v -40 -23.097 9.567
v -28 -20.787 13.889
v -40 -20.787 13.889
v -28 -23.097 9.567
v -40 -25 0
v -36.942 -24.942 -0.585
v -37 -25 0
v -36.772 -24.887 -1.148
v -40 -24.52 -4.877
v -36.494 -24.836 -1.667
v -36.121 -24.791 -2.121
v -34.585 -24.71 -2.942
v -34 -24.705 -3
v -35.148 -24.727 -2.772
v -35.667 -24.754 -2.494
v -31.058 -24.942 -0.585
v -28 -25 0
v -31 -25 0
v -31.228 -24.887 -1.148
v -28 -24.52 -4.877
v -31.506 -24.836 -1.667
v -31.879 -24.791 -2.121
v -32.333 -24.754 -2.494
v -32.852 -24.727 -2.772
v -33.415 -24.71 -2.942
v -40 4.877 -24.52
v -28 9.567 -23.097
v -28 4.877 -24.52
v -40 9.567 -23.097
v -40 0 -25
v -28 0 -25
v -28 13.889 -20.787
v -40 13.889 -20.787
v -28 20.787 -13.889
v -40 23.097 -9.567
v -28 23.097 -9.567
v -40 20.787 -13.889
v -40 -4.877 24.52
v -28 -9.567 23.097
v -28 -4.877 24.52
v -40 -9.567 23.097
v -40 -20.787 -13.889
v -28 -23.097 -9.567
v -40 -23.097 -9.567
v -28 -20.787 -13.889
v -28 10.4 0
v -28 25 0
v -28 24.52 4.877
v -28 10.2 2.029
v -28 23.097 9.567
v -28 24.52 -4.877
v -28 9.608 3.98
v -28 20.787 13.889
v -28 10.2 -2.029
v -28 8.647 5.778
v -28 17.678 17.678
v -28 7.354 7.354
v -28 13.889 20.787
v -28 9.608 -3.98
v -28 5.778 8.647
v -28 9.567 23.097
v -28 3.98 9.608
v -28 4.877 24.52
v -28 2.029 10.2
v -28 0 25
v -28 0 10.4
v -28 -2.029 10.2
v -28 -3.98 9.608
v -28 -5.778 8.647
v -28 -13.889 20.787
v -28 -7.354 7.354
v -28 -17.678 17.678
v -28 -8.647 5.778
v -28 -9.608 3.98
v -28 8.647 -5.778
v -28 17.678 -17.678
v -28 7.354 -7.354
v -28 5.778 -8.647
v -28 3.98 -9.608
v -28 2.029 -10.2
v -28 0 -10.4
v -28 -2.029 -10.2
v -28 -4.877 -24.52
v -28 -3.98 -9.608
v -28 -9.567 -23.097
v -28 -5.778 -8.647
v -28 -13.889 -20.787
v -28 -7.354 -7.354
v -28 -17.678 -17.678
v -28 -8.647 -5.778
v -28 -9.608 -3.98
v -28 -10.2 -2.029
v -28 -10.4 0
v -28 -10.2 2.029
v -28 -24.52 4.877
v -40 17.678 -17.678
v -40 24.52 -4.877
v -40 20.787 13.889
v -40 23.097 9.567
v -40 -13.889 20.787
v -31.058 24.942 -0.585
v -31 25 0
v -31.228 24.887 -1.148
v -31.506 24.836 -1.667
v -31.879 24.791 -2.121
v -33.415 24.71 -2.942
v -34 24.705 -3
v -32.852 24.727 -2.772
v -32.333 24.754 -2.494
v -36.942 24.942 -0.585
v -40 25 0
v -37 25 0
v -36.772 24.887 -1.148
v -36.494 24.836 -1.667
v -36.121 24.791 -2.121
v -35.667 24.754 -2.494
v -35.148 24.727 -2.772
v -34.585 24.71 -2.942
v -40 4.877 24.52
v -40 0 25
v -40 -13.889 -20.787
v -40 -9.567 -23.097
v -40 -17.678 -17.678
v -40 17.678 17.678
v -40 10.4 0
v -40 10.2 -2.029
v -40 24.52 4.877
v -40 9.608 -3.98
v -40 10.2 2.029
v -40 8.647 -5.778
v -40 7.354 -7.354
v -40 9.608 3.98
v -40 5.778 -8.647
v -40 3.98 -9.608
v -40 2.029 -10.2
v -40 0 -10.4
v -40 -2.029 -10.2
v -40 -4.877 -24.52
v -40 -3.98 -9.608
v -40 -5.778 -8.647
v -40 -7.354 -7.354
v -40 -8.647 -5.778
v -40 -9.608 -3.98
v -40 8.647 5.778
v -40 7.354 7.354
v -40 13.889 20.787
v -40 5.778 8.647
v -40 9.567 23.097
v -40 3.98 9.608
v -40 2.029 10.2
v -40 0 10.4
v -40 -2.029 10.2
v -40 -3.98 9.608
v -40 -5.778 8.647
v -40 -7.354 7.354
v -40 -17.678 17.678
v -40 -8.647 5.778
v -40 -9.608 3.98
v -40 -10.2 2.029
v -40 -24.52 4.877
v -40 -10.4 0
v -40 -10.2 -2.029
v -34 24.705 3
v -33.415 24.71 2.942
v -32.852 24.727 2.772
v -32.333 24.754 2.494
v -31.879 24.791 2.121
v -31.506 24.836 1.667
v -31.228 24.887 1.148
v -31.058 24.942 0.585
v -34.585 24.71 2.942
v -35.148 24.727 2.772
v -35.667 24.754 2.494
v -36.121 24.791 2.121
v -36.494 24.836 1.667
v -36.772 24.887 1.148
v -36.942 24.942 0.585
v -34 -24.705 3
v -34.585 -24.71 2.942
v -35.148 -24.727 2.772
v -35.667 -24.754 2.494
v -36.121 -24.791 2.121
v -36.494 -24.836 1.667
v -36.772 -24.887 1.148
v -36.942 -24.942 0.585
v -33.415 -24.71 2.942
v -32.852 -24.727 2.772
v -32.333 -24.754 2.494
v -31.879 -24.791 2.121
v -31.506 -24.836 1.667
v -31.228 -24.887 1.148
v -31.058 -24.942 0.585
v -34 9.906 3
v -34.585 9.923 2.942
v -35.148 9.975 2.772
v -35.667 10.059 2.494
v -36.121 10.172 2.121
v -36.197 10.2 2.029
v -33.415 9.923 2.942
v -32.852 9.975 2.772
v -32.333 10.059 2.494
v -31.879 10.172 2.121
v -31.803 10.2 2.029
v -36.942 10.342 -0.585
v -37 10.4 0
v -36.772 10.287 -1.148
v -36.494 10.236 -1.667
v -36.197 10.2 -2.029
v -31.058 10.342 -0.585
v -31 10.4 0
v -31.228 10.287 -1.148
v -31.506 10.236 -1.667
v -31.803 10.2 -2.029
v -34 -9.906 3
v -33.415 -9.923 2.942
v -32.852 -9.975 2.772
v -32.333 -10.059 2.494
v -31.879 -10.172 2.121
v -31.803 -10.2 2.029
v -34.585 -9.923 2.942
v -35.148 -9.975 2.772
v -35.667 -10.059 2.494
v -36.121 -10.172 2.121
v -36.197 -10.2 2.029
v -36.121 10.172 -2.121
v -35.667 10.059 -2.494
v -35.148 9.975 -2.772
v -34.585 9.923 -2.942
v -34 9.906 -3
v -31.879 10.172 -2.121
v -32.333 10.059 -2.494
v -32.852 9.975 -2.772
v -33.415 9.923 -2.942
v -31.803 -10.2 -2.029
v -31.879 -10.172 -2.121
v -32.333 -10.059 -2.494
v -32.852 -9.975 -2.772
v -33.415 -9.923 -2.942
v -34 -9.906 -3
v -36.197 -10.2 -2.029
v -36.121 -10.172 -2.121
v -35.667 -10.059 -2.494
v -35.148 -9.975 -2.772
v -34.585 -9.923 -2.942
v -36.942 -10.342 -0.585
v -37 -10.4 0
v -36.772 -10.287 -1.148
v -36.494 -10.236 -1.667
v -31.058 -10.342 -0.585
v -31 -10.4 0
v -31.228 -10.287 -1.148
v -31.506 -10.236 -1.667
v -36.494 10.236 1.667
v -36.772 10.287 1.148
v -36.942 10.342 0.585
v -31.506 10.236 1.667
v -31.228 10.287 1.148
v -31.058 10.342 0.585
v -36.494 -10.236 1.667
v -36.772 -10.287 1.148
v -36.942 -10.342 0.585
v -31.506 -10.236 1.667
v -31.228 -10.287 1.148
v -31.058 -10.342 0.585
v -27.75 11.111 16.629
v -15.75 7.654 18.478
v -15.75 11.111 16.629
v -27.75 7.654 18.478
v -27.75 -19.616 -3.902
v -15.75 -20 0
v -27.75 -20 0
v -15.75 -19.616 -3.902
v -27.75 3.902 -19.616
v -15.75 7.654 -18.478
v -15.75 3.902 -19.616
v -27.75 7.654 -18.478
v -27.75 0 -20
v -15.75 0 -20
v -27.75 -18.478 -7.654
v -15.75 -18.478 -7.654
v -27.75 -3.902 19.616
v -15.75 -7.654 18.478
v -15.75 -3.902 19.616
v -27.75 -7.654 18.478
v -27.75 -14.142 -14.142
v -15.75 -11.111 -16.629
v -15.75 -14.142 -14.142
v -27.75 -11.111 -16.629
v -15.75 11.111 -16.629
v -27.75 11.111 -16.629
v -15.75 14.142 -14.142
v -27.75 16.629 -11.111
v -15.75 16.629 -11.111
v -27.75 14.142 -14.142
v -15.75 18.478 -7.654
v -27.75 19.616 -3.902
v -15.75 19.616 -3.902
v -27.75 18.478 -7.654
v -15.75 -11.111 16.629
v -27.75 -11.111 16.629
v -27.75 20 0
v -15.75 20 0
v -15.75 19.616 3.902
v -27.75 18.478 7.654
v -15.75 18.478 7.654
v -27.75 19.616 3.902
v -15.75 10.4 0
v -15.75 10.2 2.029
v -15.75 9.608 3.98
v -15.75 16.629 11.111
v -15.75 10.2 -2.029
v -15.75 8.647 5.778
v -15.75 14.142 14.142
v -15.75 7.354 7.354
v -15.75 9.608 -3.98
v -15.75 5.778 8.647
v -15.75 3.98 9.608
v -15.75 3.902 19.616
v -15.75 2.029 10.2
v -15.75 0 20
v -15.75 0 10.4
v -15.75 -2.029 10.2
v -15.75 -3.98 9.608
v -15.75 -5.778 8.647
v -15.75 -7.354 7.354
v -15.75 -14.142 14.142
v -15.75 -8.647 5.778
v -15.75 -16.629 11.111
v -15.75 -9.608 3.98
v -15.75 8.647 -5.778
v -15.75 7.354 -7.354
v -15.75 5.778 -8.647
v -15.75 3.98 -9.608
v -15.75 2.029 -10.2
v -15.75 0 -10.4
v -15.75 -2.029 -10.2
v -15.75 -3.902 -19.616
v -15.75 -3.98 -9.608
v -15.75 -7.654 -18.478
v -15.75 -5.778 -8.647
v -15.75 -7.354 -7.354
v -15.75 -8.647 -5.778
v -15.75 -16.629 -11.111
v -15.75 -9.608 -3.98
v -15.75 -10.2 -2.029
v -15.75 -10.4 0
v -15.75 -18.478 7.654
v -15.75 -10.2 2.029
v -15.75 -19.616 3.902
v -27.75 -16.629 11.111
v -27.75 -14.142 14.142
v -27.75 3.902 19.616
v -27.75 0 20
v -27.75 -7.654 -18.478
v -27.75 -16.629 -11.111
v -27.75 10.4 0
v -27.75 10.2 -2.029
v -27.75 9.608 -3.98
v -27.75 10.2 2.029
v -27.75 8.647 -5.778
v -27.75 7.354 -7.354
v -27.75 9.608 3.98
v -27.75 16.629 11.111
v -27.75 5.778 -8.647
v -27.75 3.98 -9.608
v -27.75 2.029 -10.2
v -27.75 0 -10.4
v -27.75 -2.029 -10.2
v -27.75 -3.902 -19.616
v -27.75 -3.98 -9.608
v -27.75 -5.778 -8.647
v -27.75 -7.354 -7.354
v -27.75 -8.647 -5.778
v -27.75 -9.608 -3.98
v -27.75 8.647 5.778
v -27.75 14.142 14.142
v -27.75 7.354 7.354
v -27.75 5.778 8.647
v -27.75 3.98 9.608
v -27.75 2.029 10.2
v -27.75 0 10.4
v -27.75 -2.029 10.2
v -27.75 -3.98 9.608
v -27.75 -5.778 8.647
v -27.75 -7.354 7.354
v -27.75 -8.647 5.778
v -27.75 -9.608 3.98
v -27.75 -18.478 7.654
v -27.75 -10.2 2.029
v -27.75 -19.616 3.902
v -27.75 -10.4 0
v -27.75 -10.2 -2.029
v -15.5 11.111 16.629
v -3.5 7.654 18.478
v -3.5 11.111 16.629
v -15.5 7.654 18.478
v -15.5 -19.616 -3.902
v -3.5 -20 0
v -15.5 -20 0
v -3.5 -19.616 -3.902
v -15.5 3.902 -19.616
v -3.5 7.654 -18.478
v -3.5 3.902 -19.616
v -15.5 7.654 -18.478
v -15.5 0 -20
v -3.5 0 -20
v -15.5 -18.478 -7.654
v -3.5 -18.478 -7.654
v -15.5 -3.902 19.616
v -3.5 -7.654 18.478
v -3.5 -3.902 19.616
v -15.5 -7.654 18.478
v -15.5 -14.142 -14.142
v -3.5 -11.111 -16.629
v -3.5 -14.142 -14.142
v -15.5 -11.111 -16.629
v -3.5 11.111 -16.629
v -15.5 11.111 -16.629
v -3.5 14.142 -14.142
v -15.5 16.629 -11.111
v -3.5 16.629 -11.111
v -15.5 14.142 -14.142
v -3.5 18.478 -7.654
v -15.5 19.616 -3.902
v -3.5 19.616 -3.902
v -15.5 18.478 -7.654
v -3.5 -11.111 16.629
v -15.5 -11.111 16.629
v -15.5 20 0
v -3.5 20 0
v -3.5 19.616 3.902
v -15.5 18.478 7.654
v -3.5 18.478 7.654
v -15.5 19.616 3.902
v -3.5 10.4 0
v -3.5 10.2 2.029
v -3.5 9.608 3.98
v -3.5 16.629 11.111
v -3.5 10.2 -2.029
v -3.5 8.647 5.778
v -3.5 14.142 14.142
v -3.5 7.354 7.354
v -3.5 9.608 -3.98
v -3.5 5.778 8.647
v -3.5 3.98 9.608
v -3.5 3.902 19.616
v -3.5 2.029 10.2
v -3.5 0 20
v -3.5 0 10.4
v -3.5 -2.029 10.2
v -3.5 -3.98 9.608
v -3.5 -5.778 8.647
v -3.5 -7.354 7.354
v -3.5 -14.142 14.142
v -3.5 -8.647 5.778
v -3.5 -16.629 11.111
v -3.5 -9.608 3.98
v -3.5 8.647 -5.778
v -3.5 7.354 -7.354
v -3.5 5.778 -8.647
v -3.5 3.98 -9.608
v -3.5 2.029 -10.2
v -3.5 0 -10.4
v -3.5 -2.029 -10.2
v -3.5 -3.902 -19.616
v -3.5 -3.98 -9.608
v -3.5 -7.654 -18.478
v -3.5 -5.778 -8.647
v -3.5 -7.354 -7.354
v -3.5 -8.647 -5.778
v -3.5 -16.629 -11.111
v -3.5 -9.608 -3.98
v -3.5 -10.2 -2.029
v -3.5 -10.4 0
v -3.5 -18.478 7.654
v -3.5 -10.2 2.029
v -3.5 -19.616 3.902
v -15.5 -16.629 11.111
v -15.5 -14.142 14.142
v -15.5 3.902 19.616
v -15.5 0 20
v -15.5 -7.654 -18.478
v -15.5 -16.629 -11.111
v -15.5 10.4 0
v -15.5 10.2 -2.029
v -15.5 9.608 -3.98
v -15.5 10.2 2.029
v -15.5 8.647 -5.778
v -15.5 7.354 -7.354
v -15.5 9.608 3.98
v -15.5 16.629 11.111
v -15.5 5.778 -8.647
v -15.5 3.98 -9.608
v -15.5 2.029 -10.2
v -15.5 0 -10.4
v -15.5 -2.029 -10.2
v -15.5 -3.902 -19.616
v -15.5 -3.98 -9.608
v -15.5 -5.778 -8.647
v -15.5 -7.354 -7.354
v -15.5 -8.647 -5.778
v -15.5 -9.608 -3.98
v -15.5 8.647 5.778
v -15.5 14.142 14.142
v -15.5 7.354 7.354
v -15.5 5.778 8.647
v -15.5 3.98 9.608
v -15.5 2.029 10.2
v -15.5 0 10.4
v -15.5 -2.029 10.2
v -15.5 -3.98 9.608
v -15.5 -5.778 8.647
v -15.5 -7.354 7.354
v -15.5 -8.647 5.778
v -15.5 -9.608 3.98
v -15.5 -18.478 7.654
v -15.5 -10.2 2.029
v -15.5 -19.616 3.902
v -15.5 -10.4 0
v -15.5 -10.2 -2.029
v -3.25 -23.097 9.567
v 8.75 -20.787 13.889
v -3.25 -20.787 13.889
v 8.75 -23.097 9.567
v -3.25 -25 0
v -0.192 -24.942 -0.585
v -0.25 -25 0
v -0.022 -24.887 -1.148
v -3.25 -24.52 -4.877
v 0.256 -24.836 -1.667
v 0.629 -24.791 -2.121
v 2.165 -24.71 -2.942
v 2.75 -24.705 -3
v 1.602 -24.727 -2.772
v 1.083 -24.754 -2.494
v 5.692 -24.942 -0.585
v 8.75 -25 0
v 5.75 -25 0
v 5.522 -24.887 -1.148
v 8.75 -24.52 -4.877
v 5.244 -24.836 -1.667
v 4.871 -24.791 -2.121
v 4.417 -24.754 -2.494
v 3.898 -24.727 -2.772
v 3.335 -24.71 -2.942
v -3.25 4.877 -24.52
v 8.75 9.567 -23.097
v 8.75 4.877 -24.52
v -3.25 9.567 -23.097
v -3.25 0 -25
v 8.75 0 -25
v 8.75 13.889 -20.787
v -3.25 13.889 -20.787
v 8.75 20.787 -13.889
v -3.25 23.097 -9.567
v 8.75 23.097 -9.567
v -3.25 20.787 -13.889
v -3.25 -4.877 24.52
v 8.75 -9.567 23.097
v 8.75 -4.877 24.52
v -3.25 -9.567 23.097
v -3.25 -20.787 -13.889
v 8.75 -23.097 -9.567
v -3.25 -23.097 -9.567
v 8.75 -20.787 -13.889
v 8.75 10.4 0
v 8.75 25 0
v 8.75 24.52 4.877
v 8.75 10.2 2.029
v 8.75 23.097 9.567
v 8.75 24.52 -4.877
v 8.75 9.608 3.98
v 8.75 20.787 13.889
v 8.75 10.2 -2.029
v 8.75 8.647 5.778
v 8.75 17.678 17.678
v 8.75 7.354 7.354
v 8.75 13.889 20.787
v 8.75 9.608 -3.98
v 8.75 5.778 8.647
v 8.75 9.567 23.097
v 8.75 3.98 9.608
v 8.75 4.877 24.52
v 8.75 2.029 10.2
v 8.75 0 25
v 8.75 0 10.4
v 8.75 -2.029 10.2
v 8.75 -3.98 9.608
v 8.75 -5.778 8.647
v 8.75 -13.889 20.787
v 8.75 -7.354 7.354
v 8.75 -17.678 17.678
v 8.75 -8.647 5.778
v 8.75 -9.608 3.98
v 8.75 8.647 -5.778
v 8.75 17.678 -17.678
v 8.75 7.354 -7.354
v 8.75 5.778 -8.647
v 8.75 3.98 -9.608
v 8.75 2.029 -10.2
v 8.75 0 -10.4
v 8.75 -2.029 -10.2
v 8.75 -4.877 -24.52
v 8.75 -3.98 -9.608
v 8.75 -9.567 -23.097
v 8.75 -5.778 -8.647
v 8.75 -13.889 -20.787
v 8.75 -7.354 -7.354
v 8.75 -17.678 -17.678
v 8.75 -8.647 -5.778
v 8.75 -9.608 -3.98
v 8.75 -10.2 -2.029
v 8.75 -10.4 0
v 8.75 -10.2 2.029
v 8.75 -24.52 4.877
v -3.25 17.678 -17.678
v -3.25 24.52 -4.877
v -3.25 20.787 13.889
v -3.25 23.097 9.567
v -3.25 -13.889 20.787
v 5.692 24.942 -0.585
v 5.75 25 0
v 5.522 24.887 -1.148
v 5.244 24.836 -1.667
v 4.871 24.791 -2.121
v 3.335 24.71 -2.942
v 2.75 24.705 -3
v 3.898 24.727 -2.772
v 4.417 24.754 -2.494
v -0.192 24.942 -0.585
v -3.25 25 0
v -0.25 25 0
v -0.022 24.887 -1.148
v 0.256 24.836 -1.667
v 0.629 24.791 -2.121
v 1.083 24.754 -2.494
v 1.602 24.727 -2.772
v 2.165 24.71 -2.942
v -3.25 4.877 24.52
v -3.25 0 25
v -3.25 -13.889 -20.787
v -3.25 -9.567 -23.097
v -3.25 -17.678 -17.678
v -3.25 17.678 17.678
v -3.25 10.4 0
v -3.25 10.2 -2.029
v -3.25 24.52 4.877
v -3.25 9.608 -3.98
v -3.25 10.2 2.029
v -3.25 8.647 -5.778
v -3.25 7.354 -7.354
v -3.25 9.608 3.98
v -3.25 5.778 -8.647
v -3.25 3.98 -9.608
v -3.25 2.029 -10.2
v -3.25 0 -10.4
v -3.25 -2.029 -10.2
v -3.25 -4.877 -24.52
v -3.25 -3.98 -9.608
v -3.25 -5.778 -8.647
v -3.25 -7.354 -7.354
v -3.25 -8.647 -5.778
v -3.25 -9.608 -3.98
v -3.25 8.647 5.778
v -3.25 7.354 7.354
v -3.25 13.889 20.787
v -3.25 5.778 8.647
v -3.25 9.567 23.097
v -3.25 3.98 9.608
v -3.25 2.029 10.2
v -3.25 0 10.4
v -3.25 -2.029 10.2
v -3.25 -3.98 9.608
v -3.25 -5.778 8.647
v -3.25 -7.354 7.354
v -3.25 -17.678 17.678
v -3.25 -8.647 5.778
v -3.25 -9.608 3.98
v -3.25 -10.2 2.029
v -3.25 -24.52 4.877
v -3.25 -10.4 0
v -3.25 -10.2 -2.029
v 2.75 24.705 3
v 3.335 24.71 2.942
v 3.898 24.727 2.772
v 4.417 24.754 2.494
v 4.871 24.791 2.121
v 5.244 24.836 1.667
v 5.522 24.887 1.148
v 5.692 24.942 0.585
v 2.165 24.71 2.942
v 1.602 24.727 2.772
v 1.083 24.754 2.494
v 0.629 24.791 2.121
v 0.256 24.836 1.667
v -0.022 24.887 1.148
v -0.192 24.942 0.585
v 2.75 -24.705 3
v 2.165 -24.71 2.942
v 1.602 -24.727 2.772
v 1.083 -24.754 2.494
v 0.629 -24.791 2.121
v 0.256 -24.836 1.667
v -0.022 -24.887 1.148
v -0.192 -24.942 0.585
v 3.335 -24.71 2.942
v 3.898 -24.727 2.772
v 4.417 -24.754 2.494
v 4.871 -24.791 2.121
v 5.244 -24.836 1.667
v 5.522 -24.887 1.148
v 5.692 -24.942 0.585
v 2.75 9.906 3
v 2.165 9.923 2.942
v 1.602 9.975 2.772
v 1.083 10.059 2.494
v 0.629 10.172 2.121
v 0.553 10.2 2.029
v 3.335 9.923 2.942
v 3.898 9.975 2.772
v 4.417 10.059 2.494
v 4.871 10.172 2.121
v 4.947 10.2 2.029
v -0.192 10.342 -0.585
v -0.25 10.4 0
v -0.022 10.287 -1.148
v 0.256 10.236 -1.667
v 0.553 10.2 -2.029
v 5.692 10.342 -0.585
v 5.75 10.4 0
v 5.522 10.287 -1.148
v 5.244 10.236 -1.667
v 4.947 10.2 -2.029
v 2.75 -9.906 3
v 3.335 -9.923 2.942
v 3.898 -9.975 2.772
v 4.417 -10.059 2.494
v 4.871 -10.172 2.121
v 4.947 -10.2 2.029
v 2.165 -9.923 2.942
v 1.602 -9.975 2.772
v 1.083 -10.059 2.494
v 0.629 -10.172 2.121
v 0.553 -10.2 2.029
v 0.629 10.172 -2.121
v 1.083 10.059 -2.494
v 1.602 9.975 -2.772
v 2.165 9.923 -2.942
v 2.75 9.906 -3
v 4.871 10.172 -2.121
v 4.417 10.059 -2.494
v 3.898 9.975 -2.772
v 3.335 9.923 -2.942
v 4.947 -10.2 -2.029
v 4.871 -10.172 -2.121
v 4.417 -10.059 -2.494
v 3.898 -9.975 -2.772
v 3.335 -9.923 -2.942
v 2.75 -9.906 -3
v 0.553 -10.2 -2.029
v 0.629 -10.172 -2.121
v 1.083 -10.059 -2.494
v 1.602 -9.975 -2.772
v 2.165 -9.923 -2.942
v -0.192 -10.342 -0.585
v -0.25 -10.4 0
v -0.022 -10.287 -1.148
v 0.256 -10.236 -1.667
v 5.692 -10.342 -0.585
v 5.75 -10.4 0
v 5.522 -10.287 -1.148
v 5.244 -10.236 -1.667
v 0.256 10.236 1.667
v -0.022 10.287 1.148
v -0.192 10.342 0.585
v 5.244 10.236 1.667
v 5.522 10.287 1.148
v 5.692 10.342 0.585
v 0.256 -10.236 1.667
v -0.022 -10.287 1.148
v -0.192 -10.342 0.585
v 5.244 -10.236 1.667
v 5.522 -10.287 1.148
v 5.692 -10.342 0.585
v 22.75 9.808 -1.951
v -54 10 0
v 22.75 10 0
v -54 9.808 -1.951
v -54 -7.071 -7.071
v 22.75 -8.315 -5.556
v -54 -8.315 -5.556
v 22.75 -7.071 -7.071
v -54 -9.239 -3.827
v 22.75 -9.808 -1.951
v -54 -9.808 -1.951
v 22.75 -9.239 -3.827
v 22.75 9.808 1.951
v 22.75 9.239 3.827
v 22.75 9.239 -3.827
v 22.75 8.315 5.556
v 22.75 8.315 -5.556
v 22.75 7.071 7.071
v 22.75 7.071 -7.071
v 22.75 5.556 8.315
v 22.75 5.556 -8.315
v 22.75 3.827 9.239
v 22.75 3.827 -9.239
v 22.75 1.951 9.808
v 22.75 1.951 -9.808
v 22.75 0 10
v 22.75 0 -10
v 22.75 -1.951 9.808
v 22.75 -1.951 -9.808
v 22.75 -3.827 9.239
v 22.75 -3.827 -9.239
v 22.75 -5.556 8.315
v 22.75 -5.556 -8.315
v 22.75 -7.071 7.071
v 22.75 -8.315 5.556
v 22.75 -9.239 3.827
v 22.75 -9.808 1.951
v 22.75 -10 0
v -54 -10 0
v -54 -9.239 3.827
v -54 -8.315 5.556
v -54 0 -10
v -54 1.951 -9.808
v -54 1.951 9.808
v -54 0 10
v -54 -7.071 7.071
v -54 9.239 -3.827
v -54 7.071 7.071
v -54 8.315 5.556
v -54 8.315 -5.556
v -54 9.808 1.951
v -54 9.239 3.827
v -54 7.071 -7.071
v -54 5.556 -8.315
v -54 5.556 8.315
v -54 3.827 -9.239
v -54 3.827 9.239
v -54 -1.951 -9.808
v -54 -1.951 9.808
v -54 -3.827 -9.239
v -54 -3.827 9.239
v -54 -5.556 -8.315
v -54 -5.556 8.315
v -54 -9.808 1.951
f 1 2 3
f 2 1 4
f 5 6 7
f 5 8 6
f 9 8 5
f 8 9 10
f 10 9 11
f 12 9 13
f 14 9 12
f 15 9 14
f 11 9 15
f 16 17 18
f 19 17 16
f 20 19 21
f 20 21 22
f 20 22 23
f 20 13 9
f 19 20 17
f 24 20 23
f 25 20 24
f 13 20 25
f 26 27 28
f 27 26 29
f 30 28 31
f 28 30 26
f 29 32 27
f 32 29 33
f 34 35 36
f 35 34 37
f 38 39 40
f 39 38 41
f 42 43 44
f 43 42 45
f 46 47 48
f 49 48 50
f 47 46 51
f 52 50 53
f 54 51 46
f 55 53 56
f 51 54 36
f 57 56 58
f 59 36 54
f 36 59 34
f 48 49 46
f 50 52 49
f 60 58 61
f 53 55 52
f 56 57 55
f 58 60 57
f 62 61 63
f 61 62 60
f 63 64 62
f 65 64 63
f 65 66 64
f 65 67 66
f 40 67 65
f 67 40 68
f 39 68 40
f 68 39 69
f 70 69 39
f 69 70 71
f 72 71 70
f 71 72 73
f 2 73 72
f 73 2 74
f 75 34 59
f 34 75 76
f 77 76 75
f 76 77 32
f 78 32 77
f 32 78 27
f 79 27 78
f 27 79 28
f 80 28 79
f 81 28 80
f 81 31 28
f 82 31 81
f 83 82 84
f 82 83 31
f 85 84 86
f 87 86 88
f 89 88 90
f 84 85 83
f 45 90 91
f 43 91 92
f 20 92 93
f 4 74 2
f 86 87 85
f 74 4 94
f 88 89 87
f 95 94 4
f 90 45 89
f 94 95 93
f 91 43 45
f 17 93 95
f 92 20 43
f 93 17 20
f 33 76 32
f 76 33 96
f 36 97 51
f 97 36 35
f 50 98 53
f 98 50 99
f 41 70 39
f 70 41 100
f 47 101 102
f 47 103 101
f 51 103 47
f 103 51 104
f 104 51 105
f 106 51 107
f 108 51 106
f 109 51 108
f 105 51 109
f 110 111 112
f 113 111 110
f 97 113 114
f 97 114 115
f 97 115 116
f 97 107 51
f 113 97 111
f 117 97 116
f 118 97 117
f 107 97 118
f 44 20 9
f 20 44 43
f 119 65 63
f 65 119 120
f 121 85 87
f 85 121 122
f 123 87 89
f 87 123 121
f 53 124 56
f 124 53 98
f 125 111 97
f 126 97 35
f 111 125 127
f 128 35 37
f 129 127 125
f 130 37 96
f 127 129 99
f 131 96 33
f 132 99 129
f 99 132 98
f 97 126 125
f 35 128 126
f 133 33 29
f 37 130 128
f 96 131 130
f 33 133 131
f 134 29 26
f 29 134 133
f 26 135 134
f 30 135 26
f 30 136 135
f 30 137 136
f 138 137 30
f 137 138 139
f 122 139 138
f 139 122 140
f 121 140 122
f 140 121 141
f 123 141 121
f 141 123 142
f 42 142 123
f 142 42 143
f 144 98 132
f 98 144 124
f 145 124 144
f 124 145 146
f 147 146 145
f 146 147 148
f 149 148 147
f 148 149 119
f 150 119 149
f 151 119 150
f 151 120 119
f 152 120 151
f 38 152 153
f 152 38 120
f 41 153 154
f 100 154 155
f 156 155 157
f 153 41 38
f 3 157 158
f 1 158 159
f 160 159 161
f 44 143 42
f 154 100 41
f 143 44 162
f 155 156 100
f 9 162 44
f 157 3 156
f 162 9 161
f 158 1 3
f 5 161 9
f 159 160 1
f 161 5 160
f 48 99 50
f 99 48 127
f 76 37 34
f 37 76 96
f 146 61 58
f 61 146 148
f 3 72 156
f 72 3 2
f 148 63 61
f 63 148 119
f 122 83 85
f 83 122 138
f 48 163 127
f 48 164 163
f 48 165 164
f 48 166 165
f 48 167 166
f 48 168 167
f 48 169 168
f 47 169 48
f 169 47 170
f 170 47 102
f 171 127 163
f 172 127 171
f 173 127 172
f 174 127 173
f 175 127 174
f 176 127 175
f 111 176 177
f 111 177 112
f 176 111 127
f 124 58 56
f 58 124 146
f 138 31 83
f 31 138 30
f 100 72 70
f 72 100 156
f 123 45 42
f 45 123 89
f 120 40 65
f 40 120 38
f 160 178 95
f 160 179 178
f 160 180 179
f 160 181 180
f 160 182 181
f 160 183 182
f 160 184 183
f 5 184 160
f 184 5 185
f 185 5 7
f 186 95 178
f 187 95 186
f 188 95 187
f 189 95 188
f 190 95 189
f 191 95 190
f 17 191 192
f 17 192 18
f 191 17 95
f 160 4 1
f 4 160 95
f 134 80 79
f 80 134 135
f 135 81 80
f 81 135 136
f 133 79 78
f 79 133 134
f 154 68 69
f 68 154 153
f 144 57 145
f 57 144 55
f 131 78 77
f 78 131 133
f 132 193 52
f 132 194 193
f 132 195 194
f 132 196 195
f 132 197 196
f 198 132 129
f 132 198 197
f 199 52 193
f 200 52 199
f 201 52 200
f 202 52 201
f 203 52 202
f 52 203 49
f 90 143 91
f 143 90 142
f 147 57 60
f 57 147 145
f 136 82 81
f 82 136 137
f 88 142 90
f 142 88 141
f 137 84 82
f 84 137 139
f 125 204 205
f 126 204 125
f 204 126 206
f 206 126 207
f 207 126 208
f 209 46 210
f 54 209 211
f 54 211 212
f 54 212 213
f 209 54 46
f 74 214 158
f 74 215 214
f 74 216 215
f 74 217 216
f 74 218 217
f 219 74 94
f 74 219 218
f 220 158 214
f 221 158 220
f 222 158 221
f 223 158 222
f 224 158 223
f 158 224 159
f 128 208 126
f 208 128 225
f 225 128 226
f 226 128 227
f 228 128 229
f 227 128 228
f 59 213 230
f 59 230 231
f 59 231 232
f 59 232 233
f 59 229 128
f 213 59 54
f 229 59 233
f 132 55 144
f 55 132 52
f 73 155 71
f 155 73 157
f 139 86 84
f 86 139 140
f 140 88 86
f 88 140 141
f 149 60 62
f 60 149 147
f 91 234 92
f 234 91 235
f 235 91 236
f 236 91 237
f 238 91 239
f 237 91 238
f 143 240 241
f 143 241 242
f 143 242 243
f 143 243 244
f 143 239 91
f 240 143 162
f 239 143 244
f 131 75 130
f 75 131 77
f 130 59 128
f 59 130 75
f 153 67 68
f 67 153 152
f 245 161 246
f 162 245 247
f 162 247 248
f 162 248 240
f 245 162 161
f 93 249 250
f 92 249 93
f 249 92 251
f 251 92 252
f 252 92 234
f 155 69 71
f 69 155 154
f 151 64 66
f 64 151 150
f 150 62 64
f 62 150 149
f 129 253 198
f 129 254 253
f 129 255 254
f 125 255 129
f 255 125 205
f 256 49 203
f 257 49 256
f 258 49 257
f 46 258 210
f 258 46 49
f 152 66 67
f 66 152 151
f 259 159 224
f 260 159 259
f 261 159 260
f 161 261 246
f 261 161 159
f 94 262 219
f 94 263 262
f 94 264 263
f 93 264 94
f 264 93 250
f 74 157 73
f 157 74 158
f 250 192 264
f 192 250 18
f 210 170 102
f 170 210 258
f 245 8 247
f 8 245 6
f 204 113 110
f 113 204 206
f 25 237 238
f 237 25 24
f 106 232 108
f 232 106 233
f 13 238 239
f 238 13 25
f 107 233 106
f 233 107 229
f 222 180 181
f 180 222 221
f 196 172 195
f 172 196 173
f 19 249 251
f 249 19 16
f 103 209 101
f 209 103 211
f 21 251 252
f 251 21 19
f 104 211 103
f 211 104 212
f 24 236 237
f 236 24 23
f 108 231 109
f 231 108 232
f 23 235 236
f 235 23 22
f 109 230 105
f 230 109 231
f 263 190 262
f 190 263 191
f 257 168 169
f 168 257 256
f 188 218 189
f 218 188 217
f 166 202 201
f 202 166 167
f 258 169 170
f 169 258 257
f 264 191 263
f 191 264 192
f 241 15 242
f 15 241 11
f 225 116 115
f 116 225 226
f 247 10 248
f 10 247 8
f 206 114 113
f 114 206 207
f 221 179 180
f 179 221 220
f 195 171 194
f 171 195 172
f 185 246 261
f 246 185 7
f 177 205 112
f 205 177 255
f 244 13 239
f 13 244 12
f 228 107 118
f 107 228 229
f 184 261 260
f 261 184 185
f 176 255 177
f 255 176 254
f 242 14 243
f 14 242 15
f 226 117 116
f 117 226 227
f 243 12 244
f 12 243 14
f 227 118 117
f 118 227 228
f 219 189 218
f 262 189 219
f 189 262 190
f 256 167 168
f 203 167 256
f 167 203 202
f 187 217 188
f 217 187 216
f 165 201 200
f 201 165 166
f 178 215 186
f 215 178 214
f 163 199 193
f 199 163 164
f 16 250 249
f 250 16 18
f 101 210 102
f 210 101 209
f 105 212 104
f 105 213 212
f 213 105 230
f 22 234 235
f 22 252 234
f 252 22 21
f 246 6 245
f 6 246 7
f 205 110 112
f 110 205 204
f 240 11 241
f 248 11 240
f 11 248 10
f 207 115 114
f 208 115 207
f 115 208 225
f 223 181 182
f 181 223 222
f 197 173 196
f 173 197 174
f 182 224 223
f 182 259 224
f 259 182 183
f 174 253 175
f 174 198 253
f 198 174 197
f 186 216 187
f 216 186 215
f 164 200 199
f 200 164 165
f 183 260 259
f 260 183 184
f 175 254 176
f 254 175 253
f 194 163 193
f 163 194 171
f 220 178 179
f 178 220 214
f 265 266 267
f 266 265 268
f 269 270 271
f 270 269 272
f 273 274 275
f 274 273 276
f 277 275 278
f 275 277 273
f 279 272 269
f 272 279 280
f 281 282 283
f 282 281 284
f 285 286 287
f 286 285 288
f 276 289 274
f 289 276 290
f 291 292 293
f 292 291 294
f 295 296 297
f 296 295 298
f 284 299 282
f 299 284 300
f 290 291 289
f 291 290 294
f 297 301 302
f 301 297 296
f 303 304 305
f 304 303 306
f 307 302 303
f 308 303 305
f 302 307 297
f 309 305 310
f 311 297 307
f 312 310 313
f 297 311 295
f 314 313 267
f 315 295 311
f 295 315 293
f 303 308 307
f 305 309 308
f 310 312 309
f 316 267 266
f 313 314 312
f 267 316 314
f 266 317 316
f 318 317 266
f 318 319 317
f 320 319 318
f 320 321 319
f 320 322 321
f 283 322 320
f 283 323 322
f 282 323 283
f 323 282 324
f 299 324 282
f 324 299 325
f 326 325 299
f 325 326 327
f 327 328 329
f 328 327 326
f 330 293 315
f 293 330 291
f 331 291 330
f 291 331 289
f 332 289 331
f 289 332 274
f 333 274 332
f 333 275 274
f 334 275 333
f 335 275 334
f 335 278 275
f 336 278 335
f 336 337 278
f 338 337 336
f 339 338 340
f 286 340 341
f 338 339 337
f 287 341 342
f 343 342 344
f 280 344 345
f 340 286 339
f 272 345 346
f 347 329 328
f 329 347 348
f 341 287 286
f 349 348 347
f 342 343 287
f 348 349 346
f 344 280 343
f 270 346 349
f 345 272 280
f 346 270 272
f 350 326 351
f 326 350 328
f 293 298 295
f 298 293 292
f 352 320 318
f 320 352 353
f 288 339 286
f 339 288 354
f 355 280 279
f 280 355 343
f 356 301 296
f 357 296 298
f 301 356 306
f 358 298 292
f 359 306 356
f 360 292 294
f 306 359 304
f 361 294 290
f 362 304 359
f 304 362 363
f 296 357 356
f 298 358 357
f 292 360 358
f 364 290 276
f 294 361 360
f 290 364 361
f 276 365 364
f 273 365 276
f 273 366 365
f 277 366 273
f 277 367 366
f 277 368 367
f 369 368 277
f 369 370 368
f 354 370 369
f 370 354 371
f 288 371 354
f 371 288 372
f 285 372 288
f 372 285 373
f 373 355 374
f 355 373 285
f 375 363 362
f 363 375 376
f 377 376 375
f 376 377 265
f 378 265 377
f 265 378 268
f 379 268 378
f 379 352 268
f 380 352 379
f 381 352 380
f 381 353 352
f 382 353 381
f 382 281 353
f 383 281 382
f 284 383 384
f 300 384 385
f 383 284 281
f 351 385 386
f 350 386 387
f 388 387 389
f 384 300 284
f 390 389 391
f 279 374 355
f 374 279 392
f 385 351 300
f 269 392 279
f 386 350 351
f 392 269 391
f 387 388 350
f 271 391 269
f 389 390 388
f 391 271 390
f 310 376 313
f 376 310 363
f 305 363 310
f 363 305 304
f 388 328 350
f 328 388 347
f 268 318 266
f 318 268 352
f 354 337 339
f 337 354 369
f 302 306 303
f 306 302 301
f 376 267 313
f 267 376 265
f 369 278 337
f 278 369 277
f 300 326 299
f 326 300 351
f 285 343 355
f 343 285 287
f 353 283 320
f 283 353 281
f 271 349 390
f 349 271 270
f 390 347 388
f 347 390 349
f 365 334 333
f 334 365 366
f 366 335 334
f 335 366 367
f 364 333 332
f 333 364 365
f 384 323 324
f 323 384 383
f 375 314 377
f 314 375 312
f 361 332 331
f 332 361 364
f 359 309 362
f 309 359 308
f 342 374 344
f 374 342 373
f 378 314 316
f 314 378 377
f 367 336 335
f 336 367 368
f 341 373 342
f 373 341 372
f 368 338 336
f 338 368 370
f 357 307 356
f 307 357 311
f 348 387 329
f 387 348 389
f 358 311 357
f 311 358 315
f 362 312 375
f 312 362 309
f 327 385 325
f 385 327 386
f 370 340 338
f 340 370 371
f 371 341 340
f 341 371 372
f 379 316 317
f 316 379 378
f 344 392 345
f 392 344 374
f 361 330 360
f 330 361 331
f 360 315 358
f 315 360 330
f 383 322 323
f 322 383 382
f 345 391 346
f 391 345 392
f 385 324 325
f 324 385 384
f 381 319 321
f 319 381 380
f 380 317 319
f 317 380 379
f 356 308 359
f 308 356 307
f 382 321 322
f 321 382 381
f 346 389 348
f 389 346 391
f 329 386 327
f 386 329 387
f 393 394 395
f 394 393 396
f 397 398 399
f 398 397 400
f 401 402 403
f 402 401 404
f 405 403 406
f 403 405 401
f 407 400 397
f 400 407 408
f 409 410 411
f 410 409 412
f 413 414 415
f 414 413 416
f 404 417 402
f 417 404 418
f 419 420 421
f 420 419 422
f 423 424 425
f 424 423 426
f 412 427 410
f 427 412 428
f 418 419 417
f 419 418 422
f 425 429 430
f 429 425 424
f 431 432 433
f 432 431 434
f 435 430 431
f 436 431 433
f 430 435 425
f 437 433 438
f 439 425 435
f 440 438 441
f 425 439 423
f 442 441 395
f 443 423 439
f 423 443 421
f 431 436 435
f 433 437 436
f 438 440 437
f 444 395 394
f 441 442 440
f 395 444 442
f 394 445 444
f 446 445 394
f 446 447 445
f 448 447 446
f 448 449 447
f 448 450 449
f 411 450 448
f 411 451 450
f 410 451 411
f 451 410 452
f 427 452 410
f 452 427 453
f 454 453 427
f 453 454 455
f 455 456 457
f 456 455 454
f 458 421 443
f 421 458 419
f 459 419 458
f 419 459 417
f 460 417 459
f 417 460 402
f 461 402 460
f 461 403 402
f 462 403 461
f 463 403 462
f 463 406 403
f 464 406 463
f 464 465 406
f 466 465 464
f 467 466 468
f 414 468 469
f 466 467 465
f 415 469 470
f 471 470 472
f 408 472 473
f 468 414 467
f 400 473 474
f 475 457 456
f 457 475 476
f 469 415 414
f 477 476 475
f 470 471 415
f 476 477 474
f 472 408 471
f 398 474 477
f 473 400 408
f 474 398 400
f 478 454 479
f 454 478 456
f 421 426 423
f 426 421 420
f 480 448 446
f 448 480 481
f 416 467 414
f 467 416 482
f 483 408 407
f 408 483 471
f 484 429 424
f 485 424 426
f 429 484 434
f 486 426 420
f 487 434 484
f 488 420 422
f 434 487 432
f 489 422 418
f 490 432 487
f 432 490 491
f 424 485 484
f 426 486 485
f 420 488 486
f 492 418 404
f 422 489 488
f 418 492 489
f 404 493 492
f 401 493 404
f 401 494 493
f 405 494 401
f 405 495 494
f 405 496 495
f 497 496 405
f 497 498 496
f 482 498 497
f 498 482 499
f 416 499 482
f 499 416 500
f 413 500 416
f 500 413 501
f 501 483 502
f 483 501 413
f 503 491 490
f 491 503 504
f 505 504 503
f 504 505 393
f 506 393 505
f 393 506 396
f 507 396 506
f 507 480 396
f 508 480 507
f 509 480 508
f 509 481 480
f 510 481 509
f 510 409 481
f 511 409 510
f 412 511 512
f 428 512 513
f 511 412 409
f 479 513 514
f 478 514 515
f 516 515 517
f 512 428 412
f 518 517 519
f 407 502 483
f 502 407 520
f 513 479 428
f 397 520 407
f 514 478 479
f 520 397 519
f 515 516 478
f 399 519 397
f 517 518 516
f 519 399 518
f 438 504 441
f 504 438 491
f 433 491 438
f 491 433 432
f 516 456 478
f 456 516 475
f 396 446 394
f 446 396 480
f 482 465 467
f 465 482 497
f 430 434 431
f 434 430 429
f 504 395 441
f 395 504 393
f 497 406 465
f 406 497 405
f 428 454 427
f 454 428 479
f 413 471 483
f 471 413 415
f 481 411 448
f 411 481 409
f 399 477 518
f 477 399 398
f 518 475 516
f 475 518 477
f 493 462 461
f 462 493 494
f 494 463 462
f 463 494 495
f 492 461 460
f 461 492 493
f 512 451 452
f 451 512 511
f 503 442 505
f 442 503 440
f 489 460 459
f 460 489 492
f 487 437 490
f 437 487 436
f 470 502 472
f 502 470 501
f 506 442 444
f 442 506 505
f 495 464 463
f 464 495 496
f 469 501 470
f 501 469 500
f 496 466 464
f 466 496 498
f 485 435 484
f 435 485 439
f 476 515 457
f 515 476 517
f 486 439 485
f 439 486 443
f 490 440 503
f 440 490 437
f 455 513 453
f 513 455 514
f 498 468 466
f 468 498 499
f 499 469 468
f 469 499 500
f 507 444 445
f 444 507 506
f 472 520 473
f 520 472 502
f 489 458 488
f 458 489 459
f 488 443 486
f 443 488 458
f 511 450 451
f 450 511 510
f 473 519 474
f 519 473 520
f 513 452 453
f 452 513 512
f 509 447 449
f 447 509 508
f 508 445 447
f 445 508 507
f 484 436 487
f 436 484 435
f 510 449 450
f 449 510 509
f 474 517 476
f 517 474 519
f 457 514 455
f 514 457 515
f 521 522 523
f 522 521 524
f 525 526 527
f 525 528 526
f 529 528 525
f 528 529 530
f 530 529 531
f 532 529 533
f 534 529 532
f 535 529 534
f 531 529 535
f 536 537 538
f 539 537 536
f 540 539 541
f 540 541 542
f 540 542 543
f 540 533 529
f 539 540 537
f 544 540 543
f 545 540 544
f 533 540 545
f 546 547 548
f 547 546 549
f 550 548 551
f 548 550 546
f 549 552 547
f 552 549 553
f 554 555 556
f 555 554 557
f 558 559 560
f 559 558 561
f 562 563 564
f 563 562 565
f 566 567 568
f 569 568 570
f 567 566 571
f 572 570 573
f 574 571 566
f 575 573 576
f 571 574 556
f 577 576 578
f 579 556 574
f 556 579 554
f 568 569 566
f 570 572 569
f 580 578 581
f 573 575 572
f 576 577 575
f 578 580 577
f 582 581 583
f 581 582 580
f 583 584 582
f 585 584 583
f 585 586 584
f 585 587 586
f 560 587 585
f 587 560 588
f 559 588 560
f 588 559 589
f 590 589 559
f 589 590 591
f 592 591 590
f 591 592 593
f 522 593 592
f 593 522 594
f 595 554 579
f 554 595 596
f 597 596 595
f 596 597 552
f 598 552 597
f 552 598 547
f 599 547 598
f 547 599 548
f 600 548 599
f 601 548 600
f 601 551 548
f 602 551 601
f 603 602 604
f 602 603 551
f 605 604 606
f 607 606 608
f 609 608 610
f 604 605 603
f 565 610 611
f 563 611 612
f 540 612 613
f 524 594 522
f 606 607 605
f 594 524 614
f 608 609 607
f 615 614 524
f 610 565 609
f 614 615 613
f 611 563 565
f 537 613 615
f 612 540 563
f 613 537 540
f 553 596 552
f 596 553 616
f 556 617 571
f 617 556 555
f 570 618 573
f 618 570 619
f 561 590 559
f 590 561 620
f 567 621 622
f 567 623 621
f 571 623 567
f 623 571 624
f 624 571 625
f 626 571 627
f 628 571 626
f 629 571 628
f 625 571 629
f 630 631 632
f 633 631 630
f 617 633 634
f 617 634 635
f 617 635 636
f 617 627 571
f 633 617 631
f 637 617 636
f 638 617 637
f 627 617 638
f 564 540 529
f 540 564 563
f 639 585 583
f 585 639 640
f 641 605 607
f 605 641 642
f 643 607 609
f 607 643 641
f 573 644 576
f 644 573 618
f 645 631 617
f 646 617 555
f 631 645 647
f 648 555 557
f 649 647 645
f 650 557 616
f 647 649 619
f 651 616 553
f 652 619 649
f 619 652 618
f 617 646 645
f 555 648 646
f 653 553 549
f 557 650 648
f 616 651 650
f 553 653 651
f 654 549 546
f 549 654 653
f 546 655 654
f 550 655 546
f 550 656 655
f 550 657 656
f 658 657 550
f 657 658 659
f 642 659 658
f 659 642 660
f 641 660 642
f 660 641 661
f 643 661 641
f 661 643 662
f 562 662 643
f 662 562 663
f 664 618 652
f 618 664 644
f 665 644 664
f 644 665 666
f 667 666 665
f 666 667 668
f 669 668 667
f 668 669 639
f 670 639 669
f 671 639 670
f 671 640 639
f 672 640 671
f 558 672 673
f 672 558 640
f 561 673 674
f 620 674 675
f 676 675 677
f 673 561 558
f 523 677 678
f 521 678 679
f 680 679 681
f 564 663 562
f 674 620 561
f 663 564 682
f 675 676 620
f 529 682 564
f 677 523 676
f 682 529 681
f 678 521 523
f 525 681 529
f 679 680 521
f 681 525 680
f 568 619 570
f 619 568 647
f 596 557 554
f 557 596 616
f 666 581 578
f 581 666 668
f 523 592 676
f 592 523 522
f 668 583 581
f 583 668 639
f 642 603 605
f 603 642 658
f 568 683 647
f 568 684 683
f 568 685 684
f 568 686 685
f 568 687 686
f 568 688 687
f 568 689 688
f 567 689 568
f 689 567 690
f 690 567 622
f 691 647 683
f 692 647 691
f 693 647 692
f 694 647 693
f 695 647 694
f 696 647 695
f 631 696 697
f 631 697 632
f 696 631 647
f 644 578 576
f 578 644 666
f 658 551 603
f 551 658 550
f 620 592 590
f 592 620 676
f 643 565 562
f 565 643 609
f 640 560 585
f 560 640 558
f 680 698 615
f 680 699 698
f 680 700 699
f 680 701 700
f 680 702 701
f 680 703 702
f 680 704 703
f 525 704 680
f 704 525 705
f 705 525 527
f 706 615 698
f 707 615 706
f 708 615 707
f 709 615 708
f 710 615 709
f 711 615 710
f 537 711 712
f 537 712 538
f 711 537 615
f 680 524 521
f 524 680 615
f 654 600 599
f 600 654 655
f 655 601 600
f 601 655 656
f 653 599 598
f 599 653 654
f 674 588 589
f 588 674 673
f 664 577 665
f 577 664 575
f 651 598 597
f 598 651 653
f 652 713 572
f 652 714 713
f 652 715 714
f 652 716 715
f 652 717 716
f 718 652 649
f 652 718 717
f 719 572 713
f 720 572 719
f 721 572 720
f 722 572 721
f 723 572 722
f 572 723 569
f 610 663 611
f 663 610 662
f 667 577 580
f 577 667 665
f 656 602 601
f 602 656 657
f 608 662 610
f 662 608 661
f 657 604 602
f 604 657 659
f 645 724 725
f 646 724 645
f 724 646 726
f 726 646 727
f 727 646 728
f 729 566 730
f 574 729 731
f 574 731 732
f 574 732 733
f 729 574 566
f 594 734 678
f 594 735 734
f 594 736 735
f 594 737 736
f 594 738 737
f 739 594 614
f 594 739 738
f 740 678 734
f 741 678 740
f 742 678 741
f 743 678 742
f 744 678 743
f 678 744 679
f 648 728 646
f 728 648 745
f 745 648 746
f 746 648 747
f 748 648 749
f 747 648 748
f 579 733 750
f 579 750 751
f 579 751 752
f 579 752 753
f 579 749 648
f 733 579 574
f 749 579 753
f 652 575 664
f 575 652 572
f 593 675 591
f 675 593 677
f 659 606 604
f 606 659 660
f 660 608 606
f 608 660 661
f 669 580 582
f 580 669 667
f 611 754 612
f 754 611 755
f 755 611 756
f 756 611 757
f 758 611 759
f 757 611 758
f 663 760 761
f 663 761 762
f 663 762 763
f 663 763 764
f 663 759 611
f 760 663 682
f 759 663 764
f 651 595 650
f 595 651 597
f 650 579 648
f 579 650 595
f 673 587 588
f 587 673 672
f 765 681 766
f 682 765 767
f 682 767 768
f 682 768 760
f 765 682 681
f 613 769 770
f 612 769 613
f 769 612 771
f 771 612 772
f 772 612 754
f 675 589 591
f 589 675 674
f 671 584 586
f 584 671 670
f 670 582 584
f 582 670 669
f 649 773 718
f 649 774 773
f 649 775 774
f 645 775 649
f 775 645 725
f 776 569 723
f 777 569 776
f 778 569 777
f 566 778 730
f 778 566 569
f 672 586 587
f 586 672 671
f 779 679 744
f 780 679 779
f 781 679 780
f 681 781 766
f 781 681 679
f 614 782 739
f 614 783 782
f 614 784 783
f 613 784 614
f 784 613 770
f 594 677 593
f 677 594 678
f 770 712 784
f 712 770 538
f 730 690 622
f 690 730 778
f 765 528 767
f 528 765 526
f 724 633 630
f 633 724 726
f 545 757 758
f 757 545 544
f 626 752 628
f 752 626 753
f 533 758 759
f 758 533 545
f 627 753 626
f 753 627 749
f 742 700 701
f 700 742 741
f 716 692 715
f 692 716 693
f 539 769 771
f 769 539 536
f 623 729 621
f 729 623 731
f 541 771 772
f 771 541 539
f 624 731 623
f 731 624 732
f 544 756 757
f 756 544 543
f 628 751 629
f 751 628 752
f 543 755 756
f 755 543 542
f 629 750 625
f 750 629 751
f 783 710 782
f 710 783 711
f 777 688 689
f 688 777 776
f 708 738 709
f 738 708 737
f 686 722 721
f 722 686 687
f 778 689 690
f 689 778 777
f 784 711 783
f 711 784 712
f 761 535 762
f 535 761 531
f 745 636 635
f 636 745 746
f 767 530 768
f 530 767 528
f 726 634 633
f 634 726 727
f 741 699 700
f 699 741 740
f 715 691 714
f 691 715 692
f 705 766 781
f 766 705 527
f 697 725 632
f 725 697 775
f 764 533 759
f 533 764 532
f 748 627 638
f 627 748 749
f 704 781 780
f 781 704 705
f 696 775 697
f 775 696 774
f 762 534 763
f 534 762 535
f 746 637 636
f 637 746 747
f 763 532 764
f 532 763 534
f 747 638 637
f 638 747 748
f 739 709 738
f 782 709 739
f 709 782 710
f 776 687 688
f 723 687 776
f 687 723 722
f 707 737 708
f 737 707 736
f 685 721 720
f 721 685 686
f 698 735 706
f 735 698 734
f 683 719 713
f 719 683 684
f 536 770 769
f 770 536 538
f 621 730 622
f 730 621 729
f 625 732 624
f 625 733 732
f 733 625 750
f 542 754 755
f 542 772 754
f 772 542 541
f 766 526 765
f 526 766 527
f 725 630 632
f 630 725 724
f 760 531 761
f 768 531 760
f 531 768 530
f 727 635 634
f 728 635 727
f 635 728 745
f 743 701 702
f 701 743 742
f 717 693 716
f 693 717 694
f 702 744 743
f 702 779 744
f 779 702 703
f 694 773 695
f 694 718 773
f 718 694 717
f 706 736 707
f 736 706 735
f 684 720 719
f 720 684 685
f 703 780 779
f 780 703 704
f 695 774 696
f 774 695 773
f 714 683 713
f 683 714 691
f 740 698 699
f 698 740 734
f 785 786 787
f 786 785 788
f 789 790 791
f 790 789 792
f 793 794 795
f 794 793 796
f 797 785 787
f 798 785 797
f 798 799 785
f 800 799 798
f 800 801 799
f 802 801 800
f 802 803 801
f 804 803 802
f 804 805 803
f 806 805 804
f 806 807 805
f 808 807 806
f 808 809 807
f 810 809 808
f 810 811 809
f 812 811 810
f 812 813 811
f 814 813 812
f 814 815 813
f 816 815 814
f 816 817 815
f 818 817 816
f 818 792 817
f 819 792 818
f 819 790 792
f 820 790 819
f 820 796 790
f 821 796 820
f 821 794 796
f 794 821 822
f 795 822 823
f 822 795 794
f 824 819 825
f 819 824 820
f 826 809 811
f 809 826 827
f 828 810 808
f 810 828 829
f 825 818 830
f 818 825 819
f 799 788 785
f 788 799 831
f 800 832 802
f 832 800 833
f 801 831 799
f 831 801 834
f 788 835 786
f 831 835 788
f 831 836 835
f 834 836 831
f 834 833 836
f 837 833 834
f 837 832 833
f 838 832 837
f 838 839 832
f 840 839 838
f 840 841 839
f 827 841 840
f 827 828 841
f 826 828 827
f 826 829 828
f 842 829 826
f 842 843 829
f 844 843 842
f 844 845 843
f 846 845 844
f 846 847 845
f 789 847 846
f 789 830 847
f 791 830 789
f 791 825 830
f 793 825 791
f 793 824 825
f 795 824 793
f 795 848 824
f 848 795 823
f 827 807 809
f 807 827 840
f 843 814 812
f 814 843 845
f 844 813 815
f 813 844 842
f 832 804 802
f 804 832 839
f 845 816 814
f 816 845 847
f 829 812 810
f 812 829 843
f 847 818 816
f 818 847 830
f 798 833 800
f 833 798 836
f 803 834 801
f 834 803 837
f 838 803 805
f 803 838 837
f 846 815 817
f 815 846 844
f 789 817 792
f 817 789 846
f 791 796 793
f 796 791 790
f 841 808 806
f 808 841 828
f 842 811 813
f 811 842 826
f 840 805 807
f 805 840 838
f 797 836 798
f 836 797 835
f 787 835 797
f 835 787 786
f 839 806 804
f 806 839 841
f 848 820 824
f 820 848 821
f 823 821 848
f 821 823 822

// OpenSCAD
$fn = 32;

// ------------------------------------------------------------------------
// Shaft with rings and collars: d20 shaft, 4 rings
// Every part is its own module, assembly() places them once.
// ------------------------------------------------------------------------

// --- part 1 ---
module shaft() {
  translate([0, 0, -38.375]) cylinder(h = 76.75, d = 20);
}

// --- part 2 ---
module collar_a() {
  difference() {
    cylinder(h = 12, d = 50);
    translate([0, 0, -1]) cylinder(h = 14, d = 20.8);
    translate([0, 0, 6]) rotate([90, 0, 0]) cylinder(h = 52, d = 6, center = true);
  }
}

// --- part 3 ---
module spacer_a() {
  difference() {
      translate([0, 0, 0]) cylinder(h = 12, d = 40);
      translate([0, 0, -1]) cylinder(h = 14, d = 20.8);
    }
}

// --- part 4 ---
module spacer_b() {
  difference() {
      translate([0, 0, 0]) cylinder(h = 12, d = 40);
      translate([0, 0, -1]) cylinder(h = 14, d = 20.8);
    }
}

// --- part 5 ---
module collar_b() {
  difference() {
    cylinder(h = 12, d = 50);
    translate([0, 0, -1]) cylinder(h = 14, d = 20.8);
    translate([0, 0, 6]) rotate([90, 0, 0]) cylinder(h = 52, d = 6, center = true);
  }
}

// --- assembly ---
module assembly() {
  translate([-15.625, 0, 0]) rotate([0, 90, 0]) shaft();
  translate([-40, 0, 0]) rotate([0, 90, 0]) collar_a();
  translate([-27.75, 0, 0]) rotate([0, 90, 0]) spacer_a();
  translate([-15.5, 0, 0]) rotate([0, 90, 0]) spacer_b();
  translate([-3.25, 0, 0]) rotate([0, 90, 0]) collar_b();
}

assembly();
